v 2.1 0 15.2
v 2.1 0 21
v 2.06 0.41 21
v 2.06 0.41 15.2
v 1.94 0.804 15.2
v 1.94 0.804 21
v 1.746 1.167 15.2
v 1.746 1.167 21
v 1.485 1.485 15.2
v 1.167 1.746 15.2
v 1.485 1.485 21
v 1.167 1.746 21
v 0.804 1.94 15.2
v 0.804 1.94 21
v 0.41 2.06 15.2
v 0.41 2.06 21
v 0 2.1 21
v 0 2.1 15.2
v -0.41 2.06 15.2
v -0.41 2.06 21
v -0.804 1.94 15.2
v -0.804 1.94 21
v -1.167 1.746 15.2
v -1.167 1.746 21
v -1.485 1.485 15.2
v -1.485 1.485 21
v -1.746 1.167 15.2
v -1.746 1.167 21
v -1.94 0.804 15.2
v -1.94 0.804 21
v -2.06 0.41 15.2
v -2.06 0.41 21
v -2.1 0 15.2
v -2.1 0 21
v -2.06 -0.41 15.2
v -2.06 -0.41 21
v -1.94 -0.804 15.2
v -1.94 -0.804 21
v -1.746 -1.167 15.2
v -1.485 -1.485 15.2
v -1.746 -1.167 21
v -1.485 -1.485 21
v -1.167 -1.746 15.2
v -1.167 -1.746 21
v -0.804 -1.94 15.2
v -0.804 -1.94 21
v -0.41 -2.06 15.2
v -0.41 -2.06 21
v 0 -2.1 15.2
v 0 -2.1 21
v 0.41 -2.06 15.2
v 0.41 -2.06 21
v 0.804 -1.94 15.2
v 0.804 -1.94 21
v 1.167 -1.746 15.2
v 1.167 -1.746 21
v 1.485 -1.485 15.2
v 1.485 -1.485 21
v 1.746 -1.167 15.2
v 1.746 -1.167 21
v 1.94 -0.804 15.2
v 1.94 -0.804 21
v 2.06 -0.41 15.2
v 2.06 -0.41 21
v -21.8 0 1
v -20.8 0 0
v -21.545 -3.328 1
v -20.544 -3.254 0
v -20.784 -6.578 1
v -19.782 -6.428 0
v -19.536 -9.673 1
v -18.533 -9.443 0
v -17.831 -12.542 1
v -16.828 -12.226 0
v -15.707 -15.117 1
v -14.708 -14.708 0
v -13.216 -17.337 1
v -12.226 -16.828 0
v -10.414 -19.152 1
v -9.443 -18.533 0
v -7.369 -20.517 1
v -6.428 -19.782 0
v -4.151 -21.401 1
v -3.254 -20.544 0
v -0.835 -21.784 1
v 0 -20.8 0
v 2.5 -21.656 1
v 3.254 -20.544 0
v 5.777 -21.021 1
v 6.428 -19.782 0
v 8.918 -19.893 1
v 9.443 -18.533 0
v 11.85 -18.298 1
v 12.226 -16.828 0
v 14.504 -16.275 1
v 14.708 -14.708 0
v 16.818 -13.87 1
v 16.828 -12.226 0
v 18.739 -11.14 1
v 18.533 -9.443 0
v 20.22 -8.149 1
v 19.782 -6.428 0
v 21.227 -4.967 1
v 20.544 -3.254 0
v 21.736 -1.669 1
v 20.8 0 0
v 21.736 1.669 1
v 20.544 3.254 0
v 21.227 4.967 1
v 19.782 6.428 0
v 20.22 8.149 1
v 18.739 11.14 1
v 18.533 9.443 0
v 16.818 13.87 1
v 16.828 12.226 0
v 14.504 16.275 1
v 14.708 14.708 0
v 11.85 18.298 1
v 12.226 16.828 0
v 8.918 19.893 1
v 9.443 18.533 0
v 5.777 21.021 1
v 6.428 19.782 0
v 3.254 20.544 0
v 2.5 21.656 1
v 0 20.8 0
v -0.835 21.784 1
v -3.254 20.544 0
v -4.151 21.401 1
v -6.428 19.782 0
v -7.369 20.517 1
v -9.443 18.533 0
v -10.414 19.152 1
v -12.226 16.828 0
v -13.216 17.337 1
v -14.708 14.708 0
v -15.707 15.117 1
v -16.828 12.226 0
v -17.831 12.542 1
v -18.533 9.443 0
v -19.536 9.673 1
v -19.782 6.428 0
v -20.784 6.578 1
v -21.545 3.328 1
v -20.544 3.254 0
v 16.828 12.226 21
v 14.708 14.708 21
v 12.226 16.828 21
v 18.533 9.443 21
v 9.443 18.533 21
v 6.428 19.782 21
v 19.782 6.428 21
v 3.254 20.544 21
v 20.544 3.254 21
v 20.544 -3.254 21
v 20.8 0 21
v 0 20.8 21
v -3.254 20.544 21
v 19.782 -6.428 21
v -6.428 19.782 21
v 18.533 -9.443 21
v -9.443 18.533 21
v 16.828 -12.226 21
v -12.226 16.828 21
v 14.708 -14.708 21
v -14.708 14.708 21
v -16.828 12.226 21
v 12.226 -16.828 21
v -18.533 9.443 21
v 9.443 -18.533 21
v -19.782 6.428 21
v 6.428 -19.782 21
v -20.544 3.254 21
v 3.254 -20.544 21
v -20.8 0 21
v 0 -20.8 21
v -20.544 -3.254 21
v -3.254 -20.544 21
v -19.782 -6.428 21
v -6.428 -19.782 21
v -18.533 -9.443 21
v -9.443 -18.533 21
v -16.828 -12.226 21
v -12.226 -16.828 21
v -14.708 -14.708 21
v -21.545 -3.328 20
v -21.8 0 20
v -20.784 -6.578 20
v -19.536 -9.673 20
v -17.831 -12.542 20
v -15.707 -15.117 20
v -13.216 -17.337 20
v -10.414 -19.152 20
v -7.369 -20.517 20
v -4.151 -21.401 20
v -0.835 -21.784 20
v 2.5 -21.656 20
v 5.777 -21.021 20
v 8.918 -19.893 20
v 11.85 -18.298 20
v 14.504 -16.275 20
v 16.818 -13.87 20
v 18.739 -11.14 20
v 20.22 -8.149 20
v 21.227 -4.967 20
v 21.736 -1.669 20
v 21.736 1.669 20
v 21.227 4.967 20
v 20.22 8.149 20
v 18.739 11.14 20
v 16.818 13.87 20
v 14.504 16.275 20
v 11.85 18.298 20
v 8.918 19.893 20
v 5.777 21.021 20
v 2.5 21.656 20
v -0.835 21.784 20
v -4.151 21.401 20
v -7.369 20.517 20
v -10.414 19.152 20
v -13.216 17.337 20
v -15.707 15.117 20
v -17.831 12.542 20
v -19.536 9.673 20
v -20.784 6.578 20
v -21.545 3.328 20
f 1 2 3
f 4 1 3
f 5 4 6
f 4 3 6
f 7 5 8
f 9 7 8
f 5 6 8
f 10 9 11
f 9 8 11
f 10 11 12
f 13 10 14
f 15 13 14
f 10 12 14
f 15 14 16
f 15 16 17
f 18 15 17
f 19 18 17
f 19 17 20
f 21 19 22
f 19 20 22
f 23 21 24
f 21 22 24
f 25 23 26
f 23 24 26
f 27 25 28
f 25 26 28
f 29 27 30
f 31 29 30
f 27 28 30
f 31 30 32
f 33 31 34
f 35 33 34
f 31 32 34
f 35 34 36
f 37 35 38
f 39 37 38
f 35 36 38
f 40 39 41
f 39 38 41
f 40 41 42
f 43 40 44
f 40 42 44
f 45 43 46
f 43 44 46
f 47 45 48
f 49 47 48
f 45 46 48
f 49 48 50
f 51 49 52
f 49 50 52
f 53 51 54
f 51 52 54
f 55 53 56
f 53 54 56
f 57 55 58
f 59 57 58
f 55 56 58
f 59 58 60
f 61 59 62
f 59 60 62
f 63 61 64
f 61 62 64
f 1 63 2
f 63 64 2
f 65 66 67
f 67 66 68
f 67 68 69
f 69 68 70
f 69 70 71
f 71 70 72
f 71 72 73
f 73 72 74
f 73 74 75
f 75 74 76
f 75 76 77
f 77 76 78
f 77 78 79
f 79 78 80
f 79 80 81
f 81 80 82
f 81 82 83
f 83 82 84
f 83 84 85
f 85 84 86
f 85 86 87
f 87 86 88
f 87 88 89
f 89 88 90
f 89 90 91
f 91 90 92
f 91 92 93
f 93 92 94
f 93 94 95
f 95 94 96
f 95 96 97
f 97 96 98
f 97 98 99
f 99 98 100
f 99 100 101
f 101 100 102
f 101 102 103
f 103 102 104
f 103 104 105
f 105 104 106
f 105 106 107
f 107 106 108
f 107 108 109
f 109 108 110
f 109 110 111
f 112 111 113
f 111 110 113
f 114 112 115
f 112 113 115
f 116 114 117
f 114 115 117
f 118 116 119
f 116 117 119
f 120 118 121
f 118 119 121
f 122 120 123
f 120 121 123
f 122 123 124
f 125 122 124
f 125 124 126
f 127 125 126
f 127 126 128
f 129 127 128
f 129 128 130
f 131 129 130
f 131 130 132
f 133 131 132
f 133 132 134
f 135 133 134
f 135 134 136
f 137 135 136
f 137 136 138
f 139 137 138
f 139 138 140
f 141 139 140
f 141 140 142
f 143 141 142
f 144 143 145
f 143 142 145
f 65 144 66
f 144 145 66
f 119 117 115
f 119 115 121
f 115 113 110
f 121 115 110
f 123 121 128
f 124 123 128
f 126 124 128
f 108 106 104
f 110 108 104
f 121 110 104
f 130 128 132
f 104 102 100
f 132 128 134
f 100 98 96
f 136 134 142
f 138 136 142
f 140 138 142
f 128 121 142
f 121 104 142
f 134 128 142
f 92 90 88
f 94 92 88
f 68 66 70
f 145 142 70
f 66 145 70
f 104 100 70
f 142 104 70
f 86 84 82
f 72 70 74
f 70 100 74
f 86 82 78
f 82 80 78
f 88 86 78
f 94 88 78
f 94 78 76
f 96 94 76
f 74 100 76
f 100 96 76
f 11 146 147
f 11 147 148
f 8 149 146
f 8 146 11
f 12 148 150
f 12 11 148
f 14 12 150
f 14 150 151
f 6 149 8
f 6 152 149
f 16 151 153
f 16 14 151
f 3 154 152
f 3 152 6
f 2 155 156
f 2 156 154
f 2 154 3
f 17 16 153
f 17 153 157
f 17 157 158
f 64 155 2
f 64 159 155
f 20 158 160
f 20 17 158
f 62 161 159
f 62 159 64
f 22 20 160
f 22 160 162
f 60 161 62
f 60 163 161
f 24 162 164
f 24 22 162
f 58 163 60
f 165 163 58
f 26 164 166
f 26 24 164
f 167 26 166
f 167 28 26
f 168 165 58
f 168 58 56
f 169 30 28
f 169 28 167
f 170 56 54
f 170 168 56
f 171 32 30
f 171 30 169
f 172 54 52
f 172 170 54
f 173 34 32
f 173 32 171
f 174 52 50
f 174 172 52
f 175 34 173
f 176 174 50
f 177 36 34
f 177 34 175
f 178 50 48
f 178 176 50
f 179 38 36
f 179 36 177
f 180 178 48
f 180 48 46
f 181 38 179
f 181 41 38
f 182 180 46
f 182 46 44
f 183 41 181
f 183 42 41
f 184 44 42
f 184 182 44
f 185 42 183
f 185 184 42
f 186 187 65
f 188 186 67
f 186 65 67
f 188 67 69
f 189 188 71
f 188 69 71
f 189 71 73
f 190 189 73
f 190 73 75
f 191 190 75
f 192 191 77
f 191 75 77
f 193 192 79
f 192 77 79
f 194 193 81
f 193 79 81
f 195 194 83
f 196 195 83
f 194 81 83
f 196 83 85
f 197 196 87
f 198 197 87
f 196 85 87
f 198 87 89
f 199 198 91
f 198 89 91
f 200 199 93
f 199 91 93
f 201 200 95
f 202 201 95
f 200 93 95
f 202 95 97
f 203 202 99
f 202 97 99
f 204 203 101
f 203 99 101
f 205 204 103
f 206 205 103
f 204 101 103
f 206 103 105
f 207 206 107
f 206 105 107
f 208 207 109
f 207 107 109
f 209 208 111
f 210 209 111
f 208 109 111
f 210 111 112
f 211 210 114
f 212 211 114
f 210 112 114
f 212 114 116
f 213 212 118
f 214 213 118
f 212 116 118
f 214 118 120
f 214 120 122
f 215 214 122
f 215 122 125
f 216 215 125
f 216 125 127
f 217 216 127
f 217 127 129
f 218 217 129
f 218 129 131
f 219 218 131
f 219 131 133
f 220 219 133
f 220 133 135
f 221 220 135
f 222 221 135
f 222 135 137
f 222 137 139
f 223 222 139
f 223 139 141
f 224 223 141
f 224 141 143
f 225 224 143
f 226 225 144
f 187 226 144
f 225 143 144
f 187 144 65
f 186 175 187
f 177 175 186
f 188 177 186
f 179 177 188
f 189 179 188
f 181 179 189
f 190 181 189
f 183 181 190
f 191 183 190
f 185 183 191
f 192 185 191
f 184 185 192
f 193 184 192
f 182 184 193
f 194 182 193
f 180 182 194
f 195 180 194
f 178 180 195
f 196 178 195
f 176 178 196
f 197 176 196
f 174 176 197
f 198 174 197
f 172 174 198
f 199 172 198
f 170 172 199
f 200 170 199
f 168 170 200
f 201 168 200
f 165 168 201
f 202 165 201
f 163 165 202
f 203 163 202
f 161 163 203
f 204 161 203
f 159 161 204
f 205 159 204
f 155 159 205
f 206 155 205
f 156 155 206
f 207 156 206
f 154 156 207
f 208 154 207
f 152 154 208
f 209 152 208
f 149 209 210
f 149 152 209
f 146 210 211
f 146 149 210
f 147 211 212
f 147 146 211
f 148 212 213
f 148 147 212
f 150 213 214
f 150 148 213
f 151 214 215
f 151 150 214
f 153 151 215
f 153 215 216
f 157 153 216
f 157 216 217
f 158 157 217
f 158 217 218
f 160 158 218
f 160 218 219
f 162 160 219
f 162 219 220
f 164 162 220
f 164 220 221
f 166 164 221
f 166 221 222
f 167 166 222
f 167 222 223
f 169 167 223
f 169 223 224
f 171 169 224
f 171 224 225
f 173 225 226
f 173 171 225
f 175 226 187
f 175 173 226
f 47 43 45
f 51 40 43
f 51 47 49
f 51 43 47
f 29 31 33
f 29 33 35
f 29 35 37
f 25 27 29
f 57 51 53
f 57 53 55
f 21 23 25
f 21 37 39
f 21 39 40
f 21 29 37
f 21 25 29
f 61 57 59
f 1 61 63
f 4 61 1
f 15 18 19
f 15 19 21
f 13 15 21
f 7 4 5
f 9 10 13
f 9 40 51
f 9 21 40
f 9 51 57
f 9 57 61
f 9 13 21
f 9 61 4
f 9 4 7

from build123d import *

# Parameters (mm, degrees)
SKETCH1_R           = 21.8
BOSS_EXTRUDE1_DEPTH = 21
CHAMFER1_SIZE       = 1
SKETCH2_R           = 2.1
CUT_EXTRUDE1_DEPTH  = 5.8


with BuildPart() as part:
    # Sketch1 → Boss-Extrude1 (new body)
    with BuildSketch(Plane.XY):
        with Locations(Location((0, 0, 0), (0, 0, 180))):
            Circle(SKETCH1_R)
    extrude(amount=BOSS_EXTRUDE1_DEPTH)

    # Chamfer1
    chamfer1_edges = [part.edges().sort_by_distance(p)[0] for p in [
        (21.8, 0, 0),
        (21.8, 0, 21),
    ]]
    chamfer(chamfer1_edges, length=CHAMFER1_SIZE)

    # Sketch2 → Cut-Extrude1 (cut)
    with BuildSketch(Plane.XY.offset(21)):
        Circle(SKETCH2_R)
    extrude(amount=-CUT_EXTRUDE1_DEPTH, mode=Mode.SUBTRACT)


solid = part.part
